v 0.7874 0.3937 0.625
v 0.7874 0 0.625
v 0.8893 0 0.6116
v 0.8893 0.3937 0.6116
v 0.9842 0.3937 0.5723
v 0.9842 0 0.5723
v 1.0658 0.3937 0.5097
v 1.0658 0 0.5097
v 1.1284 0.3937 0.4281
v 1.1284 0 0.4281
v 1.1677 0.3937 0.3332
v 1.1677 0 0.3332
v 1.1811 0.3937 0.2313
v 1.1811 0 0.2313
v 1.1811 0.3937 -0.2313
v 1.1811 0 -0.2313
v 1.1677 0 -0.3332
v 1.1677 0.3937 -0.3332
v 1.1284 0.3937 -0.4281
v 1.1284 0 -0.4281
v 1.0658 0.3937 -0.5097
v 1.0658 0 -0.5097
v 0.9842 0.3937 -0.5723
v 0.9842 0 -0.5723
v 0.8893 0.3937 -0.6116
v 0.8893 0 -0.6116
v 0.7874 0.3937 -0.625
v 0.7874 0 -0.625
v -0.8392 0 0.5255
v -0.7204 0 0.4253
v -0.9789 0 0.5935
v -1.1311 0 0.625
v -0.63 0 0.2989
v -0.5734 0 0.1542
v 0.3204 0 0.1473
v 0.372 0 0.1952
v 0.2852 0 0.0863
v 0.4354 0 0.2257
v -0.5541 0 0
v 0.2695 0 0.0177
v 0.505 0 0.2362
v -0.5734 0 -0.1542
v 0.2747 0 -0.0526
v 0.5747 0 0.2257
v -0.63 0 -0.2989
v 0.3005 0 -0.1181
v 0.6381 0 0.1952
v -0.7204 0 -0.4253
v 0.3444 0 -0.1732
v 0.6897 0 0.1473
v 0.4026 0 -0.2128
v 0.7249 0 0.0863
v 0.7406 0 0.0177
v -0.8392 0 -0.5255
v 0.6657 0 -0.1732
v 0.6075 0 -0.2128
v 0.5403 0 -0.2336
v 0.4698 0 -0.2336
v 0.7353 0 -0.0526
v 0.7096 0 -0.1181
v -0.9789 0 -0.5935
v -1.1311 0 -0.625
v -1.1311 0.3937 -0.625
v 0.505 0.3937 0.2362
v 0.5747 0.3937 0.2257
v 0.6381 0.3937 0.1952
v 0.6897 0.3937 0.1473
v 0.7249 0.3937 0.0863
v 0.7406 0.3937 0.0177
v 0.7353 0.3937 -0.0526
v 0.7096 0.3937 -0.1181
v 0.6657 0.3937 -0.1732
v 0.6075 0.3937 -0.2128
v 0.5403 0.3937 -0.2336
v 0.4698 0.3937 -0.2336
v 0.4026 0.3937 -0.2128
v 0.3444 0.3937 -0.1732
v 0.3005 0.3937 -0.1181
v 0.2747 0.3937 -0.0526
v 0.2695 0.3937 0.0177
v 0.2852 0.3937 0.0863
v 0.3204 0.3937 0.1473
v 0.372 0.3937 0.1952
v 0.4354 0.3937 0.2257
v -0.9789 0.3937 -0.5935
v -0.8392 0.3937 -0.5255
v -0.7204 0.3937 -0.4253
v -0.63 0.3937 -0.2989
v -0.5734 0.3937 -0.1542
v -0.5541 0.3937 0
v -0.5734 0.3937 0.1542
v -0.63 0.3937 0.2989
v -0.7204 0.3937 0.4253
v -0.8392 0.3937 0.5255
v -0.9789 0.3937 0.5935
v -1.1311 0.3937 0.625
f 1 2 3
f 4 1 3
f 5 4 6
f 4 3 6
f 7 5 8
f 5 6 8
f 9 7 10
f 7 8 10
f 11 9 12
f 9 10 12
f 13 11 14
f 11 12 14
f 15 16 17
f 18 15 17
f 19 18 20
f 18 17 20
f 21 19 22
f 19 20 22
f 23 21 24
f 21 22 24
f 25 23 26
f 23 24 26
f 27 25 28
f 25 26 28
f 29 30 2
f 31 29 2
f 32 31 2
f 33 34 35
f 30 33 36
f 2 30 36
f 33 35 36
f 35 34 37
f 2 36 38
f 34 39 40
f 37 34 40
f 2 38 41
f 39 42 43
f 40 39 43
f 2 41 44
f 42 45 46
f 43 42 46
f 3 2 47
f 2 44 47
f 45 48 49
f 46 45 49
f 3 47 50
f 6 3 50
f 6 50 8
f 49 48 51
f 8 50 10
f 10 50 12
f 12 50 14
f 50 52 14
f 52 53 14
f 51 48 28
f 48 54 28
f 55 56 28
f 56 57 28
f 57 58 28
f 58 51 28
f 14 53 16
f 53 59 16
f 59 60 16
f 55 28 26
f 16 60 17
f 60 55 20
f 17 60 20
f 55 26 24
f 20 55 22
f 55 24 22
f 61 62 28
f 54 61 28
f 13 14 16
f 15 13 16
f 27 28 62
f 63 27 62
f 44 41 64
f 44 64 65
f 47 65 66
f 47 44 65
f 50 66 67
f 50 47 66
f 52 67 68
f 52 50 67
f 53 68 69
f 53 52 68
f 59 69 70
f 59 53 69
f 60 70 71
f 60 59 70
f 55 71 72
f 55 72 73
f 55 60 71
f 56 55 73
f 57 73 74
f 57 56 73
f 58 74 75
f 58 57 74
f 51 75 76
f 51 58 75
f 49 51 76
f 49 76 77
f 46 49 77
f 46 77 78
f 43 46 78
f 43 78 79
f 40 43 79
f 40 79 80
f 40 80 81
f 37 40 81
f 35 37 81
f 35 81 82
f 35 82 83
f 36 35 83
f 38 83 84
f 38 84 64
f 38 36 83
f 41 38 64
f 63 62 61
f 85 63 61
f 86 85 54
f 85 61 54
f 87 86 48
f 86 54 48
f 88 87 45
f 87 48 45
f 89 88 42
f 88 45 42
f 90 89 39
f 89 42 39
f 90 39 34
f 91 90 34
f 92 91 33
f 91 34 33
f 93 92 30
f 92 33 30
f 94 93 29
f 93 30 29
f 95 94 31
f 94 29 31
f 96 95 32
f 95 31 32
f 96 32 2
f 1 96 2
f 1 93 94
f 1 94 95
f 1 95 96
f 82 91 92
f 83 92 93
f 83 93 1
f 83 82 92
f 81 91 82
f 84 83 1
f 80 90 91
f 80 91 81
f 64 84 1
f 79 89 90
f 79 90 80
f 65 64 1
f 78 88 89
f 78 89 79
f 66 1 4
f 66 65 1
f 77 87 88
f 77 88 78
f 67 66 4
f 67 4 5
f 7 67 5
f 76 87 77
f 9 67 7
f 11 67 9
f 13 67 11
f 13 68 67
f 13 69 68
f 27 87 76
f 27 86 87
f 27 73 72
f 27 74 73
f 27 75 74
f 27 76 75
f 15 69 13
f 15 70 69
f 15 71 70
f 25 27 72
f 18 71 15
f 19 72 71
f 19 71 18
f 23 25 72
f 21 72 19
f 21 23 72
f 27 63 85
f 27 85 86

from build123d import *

# Parameters (mm, degrees)
SKETCH1_R           = 0.2362205
BOSS_EXTRUDE1_DEPTH = 0.393701


with BuildPart() as part:
    # Sketch1 → Boss-Extrude1 (new body)
    with BuildSketch(Plane(origin=(0, 0, 0), x_dir=(1, 0, 0), z_dir=(0, 1, 0))):
        with BuildLine():
            Line((0.787399, 0.625), (-1.131091774, 0.625))
            ThreePointArc((-1.131091774, 0.625), (-0.72040441, 0.425306238), (-0.554102534, 0))
            ThreePointArc((-0.554102534, 0), (-0.72040441, -0.425306238), (-1.131091774, -0.625))
            Line((-1.131091774, -0.625), (0.787399, -0.625))
            ThreePointArc((0.787399, -0.625), (1.065787647, -0.509687647), (1.1811, -0.231299))
            Line((1.1811, -0.231299), (1.1811, 0.231299))
            ThreePointArc((1.1811, 0.231299), (1.065787647, 0.509687647), (0.787399, 0.625))
        make_face()
        with Locations(Location((0.505047652, 0, 0), (0, 0, 270))):
            Circle(SKETCH1_R, mode=Mode.SUBTRACT)
    extrude(amount=BOSS_EXTRUDE1_DEPTH)


solid = part.part
